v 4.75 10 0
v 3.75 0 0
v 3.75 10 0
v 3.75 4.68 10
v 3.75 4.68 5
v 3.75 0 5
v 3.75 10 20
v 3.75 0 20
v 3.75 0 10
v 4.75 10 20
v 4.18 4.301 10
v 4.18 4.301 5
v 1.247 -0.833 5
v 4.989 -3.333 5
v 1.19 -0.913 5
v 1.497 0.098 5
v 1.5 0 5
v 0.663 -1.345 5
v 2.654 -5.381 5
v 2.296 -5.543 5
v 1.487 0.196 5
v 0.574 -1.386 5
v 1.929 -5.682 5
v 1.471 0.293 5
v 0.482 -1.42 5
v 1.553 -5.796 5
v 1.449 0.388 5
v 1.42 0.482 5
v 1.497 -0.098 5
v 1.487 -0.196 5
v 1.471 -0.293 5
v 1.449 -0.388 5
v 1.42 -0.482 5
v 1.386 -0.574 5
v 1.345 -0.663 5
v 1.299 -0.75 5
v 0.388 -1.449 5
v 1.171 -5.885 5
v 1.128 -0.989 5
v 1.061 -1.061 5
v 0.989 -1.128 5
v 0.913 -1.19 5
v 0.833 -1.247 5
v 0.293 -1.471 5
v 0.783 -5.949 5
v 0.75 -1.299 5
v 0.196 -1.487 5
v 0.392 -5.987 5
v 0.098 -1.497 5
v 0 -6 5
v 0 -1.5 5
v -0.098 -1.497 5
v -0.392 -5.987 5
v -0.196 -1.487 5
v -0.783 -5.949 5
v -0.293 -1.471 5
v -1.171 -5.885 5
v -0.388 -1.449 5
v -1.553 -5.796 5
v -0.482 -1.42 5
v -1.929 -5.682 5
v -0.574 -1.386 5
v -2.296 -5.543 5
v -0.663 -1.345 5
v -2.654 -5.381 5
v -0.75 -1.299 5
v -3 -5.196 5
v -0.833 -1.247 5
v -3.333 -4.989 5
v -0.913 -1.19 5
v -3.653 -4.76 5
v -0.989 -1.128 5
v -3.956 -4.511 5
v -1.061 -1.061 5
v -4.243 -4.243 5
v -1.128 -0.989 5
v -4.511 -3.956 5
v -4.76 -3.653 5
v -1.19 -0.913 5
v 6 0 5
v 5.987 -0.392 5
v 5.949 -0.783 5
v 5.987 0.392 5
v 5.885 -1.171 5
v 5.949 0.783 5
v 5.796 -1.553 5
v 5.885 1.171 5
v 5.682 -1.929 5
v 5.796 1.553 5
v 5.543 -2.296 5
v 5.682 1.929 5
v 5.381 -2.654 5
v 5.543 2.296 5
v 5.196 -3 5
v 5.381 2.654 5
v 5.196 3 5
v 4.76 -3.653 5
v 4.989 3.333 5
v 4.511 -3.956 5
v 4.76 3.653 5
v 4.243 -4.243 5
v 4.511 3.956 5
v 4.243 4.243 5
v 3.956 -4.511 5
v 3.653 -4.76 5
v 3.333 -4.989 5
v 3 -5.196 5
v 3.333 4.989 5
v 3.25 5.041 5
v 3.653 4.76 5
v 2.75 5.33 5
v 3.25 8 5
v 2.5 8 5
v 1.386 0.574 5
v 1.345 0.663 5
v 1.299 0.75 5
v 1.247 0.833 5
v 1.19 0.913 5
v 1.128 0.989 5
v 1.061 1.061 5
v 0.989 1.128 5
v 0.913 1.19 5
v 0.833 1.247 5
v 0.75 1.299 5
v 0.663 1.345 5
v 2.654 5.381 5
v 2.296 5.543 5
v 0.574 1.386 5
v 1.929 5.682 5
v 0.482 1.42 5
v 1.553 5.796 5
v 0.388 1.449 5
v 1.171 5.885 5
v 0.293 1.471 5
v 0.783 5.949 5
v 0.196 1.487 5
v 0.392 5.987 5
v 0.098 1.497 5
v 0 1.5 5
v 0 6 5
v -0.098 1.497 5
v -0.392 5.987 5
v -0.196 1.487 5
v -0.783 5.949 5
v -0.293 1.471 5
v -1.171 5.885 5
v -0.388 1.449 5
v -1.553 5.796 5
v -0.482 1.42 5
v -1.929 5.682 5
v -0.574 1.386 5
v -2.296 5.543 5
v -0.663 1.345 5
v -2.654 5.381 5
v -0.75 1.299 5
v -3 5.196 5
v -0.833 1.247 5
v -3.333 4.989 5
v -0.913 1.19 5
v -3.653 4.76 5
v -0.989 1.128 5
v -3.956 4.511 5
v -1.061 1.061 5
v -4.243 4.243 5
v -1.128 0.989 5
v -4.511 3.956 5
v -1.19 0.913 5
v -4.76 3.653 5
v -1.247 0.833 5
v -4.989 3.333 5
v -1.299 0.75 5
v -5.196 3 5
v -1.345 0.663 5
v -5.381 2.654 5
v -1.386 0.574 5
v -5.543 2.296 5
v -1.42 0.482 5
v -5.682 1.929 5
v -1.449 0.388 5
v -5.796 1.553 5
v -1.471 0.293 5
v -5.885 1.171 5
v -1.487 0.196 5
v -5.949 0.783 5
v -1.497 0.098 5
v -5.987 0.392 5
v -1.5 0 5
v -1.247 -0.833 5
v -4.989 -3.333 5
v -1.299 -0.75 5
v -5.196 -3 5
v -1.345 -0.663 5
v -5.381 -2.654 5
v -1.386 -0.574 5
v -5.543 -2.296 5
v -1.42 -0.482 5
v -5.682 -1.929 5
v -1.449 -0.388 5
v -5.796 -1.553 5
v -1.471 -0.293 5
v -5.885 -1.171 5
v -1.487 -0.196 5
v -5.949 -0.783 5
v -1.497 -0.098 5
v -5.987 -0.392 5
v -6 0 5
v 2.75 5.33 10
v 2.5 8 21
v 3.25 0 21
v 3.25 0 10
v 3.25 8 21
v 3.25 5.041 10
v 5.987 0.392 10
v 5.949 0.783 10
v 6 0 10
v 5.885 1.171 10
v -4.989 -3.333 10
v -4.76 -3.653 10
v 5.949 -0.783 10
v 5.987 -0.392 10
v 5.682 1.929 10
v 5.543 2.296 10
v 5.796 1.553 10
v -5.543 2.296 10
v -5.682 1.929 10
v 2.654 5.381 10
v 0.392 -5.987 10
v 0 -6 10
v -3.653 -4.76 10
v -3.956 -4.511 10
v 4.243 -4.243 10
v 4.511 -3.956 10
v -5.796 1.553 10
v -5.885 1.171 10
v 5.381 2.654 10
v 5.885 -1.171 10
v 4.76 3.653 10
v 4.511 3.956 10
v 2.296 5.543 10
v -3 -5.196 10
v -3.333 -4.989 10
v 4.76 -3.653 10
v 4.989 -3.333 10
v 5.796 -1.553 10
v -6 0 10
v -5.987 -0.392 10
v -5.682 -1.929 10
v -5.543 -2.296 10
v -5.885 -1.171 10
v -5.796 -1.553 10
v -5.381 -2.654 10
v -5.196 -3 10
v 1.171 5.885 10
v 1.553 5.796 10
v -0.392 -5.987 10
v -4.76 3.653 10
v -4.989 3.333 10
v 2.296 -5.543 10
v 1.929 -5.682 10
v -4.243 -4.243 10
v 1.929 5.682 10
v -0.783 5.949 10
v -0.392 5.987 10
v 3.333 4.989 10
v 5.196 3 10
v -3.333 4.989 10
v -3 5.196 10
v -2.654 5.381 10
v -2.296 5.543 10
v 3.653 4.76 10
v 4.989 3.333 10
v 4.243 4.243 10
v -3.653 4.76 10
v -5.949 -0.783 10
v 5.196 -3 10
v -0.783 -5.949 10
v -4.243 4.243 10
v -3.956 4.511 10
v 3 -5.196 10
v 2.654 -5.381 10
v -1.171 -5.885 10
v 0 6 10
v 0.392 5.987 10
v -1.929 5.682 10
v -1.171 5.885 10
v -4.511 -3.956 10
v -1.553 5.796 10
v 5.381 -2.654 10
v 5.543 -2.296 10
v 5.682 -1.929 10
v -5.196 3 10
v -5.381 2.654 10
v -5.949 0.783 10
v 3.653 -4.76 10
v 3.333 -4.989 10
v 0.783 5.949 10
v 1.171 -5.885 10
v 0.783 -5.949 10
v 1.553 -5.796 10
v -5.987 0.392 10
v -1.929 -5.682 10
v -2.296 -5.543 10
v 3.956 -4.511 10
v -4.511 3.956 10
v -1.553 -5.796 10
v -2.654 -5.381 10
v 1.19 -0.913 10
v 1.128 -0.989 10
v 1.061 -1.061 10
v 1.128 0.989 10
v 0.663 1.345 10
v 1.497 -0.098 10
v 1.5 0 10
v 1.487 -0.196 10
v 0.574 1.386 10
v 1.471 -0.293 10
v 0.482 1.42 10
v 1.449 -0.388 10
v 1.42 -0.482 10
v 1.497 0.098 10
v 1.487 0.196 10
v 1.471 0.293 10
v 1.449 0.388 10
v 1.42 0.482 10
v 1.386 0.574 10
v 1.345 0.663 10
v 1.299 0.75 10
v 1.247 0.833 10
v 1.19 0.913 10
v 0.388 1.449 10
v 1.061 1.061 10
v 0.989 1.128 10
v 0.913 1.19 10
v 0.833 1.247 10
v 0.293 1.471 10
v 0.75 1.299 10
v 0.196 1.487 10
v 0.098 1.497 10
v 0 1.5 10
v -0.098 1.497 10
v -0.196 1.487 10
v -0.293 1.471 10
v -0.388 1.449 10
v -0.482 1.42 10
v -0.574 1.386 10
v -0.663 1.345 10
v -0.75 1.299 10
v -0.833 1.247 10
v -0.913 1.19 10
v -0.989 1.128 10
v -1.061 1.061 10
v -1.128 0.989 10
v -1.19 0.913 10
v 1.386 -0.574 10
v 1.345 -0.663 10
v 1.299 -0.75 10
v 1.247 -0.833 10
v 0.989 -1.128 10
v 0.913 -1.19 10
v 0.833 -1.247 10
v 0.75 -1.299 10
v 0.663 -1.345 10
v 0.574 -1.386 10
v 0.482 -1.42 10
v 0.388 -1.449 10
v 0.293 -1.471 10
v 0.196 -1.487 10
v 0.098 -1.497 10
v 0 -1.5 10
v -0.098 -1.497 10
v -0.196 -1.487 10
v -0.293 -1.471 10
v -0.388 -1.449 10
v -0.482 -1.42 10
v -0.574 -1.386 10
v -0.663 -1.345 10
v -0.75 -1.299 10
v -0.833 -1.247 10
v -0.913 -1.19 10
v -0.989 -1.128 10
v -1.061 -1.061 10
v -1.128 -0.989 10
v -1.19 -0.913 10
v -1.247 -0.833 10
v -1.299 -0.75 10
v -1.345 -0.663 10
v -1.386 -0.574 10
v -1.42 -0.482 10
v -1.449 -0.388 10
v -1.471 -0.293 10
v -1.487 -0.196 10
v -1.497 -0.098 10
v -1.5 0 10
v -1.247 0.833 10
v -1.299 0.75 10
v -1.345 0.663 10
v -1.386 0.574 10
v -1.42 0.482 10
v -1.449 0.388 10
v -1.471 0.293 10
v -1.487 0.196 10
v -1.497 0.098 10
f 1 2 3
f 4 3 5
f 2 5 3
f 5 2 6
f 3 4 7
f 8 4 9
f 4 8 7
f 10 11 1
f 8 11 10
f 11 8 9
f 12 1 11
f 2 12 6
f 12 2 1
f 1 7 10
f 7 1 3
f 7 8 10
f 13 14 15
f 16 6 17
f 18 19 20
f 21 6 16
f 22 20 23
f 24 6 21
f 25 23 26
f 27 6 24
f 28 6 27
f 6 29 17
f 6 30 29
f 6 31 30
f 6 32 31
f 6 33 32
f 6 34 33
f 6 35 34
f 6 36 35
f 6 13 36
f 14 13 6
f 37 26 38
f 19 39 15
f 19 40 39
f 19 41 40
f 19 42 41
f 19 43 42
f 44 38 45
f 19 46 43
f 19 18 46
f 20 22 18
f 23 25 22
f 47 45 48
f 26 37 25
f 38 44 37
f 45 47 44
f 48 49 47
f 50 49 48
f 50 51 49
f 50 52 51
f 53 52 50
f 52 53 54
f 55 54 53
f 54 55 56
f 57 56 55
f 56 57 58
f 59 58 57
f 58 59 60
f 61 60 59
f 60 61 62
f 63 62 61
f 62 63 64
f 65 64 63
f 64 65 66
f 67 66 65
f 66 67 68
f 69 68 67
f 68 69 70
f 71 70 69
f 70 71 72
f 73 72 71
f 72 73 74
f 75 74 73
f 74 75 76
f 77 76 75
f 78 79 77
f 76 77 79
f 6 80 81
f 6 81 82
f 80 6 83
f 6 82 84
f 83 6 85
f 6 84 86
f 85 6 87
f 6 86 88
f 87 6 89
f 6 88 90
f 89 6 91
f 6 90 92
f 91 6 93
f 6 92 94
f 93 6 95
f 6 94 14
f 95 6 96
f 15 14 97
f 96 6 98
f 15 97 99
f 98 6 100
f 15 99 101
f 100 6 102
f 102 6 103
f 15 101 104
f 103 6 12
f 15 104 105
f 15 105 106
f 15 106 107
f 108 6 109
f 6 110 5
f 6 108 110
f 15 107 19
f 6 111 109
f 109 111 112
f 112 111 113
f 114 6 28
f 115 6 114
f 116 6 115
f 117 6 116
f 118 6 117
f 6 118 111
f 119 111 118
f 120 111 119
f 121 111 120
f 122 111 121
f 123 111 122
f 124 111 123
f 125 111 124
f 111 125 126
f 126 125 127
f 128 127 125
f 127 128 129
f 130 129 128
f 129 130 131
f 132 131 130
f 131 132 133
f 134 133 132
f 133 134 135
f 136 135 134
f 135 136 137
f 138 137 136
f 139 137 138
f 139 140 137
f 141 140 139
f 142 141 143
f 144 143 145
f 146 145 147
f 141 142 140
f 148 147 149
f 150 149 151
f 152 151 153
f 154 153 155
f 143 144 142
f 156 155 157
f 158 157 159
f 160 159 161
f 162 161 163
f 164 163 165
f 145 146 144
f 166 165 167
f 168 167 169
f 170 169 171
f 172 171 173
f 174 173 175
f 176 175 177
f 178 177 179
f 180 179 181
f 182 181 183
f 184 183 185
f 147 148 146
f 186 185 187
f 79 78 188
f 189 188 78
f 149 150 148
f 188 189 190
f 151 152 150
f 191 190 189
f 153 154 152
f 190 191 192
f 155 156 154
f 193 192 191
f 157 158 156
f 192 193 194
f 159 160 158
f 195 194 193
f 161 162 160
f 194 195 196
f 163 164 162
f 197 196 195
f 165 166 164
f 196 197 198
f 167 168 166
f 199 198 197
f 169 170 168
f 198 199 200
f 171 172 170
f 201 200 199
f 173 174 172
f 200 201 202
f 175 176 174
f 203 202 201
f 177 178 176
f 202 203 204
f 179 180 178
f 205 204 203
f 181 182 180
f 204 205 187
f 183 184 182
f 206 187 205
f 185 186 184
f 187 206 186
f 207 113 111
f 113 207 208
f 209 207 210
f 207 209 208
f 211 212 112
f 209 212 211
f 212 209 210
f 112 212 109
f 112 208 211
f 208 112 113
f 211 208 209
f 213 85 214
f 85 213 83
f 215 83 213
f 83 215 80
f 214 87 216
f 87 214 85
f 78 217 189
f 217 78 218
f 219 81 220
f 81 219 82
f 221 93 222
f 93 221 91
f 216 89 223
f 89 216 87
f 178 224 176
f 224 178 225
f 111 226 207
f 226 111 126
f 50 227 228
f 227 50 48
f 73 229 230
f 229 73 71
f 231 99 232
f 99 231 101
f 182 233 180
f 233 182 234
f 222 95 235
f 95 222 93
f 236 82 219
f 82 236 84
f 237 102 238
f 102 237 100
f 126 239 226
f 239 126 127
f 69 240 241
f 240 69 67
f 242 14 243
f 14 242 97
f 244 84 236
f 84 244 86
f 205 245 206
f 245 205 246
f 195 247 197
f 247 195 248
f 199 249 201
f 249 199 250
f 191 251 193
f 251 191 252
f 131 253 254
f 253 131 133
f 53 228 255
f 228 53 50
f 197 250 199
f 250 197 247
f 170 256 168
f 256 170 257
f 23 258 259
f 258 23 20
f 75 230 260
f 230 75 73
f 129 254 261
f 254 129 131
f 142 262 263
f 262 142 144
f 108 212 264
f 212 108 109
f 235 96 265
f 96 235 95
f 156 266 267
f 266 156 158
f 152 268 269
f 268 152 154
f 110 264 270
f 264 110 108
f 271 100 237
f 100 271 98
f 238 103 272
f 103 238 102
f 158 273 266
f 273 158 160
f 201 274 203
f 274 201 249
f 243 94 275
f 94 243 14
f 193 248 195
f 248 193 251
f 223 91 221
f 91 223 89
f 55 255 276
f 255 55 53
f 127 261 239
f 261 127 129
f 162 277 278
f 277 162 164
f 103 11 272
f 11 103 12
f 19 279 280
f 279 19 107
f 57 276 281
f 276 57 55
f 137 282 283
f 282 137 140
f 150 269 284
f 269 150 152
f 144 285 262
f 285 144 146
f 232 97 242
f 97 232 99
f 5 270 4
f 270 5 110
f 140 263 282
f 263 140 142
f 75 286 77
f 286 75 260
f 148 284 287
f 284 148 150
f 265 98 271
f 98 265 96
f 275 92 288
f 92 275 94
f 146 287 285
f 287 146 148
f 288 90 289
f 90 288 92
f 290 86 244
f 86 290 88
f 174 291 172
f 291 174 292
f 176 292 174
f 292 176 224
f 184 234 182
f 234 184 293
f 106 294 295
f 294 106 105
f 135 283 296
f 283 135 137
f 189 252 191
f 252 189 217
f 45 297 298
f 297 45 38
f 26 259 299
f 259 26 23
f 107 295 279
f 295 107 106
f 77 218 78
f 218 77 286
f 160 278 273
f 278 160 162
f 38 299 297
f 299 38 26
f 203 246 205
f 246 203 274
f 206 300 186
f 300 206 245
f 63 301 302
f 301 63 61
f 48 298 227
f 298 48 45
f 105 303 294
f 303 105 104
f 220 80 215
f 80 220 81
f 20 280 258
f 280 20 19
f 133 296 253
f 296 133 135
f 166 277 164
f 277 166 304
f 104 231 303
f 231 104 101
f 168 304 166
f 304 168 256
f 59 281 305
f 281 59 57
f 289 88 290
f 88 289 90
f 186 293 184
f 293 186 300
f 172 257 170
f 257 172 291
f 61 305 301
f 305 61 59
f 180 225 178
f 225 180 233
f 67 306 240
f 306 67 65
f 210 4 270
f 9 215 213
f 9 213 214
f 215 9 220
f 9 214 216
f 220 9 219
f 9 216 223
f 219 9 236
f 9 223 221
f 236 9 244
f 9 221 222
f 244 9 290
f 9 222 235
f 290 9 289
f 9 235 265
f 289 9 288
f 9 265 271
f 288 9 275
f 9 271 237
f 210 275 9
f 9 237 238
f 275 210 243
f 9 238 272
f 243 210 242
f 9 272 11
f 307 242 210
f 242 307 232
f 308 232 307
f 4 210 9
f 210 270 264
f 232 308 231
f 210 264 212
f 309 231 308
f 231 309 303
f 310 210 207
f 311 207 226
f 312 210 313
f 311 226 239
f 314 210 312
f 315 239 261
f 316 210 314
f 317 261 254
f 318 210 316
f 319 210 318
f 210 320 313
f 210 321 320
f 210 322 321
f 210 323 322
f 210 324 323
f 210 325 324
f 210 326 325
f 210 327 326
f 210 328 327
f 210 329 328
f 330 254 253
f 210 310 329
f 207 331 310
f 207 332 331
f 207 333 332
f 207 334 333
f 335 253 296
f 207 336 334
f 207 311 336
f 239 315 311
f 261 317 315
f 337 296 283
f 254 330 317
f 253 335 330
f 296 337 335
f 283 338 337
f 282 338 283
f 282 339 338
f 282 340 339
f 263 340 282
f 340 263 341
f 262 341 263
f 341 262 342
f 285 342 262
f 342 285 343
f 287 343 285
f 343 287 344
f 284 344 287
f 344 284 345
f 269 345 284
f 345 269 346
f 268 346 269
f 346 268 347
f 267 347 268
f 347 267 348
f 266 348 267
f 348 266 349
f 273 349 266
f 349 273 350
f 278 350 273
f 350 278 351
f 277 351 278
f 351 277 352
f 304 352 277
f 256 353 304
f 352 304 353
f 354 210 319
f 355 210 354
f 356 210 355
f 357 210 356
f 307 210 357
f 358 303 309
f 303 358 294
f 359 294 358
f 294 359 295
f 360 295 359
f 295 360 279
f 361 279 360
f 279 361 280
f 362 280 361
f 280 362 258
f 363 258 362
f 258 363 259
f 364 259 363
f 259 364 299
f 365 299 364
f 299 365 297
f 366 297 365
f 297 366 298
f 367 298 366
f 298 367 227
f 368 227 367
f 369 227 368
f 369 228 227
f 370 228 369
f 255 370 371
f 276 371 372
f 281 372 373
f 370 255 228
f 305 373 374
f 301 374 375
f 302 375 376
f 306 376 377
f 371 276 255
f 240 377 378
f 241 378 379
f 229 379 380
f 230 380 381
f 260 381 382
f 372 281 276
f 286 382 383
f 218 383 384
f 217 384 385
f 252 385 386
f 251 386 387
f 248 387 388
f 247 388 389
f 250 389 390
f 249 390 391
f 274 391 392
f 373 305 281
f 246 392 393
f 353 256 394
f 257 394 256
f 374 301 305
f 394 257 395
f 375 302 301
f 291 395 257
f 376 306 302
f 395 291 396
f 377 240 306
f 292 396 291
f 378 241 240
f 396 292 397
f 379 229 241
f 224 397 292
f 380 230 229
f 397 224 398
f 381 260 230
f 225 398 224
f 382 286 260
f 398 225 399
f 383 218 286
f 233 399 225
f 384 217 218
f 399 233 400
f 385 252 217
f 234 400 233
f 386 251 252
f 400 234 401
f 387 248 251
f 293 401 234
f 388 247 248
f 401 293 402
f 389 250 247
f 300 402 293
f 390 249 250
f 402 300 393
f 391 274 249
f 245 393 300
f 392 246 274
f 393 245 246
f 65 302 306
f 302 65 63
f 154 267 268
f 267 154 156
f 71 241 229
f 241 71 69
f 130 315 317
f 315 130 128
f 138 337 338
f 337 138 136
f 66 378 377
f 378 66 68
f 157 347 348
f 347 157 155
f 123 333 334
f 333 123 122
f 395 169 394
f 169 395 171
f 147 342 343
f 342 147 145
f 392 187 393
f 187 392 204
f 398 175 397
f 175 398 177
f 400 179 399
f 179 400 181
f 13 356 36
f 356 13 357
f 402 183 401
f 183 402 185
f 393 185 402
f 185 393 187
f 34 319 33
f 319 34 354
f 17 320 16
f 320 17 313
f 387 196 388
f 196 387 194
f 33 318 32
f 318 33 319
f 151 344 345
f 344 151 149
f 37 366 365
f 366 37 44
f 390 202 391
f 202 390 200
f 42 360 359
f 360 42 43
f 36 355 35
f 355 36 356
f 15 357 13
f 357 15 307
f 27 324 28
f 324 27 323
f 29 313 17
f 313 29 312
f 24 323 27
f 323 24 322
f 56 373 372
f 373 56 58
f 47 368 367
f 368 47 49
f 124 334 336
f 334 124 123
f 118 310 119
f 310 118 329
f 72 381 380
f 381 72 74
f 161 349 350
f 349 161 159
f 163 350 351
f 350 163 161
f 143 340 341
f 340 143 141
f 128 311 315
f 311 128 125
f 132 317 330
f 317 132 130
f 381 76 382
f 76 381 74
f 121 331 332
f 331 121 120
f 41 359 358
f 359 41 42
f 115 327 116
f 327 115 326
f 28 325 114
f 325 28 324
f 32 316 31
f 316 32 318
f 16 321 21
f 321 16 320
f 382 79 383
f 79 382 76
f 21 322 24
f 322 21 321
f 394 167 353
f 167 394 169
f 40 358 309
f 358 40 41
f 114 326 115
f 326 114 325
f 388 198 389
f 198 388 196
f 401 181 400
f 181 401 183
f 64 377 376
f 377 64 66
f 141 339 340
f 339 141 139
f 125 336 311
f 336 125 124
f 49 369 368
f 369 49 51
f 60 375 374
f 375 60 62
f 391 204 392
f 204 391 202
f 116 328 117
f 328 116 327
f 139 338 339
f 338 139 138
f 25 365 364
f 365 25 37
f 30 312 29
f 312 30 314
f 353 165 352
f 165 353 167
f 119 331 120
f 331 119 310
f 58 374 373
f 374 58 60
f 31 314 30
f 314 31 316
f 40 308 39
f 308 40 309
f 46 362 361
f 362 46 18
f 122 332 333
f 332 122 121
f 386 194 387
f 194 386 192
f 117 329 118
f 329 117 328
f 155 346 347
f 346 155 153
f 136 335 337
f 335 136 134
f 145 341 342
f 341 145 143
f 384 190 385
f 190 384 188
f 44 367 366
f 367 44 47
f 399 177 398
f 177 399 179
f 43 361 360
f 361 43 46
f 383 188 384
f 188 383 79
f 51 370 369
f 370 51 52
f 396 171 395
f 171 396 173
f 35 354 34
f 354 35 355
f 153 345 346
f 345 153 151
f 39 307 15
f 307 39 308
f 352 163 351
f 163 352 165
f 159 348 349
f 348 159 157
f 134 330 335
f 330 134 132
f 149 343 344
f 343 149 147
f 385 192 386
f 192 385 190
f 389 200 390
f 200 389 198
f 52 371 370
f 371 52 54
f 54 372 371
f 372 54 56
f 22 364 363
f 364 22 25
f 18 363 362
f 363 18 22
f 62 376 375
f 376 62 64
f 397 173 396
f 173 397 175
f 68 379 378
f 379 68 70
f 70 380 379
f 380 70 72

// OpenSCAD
// Hose-barb reducer: 8 mm ID tubing to 5 mm ID tubing
// Print orientation: standing upright along Z, centred on origin in X/Y

$fn = 96;

// ---- Dimensions (mm) ----
id_large      = 8;     // inner diameter of 8 mm tubing
id_small      = 5;     // inner diameter of 5 mm tubing
bore          = 3;     // through-bore diameter
barb_h_large  = 10;    // height of each 8 mm barb
barb_od_large = 9.5;   // outer diameter of 8 mm barb at top
barb_od_base  = 7.5;   // outer diameter of 8 mm barb at bottom (sawtooth base)
collar_d      = 12;    // diameter of cylindrical collar
collar_len    = 5;     // length of collar (z = 20 to 25)
barb_h_small  = 8;     // height of each 5 mm barb
barb_od_small = 6.5;   // outer diameter of 5 mm barb at bottom
barb_od_top   = 5.0;   // outer diameter of 5 mm barb at top
barb_len      = 8;     // extended length of barbs for insertion
total_len     = 41;    // overall length (z = 0 to 41)

eps = 0.5;             // cutter overshoot past faces

// ---- Model ----
difference() {
    union() {
        // 8 mm tubing barbs: z = 0 to 20
        for (i = [0 : 1]) {
            translate([0, 0, i * barb_h_large])
                linear_extrude(height = barb_h_large)
                    polygon([
                        [barb_od_base / 2, 0],
                        [barb_od_large / 2, barb_h_large],
                        [barb_od_base / 2, barb_h_large]
                    ]);
        }
        // Collar: z = 20 to 25
        translate([0, 0, collar_len])
            cylinder(d = collar_d, h = collar_len);
        // 5 mm tubing barbs: z = 25 to 41
        for (i = [0 : 1]) {
            translate([0, 0, collar_len + i * barb_h_small])
                linear_extrude(height = barb_h_small)
                    polygon([
                        [barb_od_small / 2, 0],
                        [barb_od_top / 2, barb_h_small],
                        [barb_od_small / 2, barb_h_small]
                    ]);
        }
    }
    // Through-bore along Z
    translate([0, 0, -eps])
        cylinder(d = bore, h = total_len + 2 * eps);
}
